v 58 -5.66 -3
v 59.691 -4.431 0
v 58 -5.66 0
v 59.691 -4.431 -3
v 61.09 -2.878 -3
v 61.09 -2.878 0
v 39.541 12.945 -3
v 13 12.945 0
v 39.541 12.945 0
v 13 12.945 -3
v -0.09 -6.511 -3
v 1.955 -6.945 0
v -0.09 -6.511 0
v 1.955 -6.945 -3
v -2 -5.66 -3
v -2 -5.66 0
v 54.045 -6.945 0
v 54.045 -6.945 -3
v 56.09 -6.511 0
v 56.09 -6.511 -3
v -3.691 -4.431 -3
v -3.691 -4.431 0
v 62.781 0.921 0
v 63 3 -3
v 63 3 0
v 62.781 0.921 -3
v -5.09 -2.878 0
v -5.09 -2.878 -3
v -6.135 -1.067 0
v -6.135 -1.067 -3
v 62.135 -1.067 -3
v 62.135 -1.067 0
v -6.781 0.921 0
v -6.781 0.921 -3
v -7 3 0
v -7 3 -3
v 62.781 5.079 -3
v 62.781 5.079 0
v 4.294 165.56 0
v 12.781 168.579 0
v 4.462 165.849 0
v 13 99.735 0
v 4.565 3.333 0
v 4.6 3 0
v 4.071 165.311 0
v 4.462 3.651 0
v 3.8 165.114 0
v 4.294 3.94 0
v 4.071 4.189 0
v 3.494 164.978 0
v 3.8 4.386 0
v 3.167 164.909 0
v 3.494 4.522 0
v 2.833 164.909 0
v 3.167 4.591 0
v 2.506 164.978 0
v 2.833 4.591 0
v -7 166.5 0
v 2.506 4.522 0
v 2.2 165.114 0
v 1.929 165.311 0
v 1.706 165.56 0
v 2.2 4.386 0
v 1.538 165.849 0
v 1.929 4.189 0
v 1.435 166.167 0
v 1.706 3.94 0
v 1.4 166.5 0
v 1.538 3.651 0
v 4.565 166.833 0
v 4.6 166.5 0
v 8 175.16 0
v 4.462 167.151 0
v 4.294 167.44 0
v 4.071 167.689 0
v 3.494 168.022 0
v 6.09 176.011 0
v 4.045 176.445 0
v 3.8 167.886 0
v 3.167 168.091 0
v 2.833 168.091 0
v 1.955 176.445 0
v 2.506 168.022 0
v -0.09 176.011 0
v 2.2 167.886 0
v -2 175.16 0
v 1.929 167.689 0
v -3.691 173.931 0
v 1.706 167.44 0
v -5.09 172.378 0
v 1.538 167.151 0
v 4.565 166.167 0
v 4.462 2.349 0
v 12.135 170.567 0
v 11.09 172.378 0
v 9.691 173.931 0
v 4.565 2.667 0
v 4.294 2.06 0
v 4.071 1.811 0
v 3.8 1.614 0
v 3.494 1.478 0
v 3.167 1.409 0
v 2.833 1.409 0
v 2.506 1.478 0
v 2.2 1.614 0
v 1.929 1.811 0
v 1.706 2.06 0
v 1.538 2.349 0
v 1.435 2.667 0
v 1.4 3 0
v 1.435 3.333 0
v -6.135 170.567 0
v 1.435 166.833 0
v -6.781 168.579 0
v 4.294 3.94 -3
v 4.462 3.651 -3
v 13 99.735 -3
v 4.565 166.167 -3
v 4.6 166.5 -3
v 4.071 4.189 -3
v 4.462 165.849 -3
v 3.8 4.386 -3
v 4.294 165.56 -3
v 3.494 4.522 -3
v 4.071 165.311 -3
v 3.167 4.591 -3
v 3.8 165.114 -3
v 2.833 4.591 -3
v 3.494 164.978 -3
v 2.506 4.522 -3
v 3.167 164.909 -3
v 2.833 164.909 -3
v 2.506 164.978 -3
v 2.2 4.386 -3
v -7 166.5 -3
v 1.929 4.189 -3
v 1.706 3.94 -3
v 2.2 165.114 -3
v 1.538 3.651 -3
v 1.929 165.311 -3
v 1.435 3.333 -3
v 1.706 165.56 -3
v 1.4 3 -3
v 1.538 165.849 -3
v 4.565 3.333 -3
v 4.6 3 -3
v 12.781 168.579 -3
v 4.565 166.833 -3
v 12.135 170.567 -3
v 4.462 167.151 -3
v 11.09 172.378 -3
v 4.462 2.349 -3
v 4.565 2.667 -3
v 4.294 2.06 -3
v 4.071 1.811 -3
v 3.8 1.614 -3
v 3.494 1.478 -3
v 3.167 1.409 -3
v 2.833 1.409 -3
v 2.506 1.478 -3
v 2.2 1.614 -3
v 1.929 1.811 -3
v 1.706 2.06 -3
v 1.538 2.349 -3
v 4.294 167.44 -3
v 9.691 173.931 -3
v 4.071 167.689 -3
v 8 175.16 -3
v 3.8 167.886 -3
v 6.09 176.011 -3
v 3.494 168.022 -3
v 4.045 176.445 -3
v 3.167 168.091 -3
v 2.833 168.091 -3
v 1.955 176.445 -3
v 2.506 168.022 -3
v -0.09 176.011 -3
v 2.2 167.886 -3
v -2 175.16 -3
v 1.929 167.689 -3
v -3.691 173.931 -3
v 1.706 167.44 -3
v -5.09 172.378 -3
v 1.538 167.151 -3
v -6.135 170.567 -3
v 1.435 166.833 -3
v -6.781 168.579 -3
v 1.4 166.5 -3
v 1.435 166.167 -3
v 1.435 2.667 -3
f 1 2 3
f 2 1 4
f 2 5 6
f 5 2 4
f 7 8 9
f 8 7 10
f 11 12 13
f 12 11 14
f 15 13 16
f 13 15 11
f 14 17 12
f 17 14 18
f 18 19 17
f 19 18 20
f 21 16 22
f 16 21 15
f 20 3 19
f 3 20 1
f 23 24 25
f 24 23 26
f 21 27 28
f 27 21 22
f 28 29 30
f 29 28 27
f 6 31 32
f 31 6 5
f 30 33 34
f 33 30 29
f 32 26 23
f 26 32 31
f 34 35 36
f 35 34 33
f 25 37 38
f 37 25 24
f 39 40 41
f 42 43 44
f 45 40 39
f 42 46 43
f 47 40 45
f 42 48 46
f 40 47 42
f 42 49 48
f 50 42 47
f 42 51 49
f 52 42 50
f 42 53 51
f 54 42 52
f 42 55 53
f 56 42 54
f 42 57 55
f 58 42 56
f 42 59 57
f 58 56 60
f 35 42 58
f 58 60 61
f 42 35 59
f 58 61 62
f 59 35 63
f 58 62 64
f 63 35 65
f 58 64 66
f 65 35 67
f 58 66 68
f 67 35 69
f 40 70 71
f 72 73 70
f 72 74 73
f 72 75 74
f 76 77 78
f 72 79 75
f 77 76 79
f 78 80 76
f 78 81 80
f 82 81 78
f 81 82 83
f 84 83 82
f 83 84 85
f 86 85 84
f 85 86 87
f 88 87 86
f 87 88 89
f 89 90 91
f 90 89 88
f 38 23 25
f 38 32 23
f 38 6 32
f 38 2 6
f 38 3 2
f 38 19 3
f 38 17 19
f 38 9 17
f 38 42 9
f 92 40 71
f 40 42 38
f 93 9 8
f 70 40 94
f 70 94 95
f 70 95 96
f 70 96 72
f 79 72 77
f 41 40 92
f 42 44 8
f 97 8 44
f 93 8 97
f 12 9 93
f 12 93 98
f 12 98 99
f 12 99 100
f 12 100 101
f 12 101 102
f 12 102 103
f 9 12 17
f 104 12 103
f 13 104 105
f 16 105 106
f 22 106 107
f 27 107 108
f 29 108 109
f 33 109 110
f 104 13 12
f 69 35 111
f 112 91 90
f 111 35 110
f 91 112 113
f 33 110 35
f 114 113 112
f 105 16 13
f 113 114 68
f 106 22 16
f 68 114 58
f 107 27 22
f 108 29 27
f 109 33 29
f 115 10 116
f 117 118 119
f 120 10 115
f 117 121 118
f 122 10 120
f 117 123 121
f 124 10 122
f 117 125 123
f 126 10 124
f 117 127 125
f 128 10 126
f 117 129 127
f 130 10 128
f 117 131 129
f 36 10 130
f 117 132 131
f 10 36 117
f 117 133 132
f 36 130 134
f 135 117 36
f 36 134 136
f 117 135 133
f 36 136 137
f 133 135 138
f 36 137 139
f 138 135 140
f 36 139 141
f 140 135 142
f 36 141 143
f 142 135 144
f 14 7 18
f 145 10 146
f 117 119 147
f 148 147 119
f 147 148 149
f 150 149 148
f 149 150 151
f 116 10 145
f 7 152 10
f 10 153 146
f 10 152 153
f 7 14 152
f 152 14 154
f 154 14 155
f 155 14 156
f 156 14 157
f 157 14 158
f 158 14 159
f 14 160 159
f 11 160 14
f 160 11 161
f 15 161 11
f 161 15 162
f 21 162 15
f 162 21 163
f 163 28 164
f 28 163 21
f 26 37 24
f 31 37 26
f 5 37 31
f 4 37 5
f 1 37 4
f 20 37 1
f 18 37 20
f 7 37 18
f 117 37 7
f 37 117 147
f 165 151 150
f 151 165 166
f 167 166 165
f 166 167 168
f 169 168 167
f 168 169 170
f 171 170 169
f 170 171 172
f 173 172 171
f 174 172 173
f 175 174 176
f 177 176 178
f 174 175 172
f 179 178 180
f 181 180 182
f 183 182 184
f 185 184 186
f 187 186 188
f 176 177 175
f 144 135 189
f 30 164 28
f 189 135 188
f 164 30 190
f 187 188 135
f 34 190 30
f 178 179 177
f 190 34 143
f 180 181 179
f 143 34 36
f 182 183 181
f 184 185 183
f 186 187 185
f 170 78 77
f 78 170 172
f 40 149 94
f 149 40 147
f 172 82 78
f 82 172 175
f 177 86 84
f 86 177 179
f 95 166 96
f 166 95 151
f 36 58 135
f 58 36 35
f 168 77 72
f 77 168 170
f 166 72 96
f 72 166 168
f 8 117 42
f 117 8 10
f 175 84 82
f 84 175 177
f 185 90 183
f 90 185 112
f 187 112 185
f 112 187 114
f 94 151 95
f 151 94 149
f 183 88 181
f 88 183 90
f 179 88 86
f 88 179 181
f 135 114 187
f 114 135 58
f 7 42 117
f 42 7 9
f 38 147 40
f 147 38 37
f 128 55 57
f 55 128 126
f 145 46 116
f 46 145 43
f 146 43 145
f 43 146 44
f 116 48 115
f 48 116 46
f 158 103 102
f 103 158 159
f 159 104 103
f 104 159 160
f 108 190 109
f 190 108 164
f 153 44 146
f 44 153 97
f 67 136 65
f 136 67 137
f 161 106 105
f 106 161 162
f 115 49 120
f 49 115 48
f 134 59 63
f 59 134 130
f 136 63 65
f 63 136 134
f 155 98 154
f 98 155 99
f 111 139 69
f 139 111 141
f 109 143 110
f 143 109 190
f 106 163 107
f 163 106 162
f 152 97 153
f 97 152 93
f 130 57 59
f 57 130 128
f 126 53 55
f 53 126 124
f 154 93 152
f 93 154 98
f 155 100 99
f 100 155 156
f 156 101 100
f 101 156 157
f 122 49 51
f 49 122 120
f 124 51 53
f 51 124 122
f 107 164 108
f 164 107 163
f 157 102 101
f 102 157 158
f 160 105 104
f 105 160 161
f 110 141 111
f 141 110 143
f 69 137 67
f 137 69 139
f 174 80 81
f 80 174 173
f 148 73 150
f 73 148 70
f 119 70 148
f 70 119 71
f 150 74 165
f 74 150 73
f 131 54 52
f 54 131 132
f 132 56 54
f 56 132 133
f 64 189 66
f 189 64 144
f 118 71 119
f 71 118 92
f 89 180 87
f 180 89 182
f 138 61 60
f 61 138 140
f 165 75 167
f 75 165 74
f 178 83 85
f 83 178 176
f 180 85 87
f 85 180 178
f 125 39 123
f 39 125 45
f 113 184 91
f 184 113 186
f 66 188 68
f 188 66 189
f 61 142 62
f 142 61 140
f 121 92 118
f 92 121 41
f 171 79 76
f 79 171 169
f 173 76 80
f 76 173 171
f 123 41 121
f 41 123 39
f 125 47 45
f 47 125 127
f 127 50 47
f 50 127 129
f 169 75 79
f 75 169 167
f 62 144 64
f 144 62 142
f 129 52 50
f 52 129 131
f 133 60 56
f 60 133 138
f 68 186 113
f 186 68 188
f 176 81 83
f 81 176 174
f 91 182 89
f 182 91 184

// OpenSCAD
boltHoleDia = 3.2;

c0 = [3,3,0];
c1 = [3,327-3-3.2,0];
c2 = [327-3-3.2,327-3-3.2,0];
c3 = [327-3-3.2,3,0];

s0 = [3 + 327/2,3,0];
s1 = [3 + 327/2,327-3-3.2,0];
s2 = [327-3-3.2,3+327/2,0];
s3 = [3,3+327/2,0];

// color("gray") bed();
translate([0,0,-3]) corner0();

module corner0($fn=30,cHeight=3) {
   p0 = [3+50,3,0]; /* point along short side */

   difference() {
      union() {
         /* main structure */
         hull() {
            translate(c0) cylinder(r=10,h=cHeight);
            translate(p0) cylinder(r=10,h=cHeight);
         }
         hull() {
            translate(c0) cylinder(r=10,h=cHeight);
            translate(s3) cylinder(r=10,h=cHeight);
         }
         hull() {
            translate(p0) cylinder(r=10,h=cHeight);
            translate(s3) cylinder(r=10,h=cHeight);
         }
      }

      /* bits to difference out */
      translate([0,0,-0.5]) {
         translate(c0) cylinder(h=cHeight+1,d=boltHoleDia);
         translate(s3) cylinder(h=cHeight+1,d=boltHoleDia);
      }
   }
}

module bed($fn=30) {
   difference() {
      cube([327,327,3]);

      translate([3.2/2,3.2/2,-0.5]) {
         /* corners */
         translate(c0) cylinder(h=5,d=boltHoleDia);
         translate(c1) cylinder(h=5,d=boltHoleDia);
         translate(c2) cylinder(h=5,d=boltHoleDia);
         translate(c3) cylinder(h=5,d=boltHoleDia);

         /* sides */
         translate(s0) cylinder(h=5,d=boltHoleDia);
         translate(s1) cylinder(h=5,d=boltHoleDia);
         translate(s2) cylinder(h=5,d=boltHoleDia);
         translate(s3) cylinder(h=5,d=boltHoleDia);
      }
   }
}
